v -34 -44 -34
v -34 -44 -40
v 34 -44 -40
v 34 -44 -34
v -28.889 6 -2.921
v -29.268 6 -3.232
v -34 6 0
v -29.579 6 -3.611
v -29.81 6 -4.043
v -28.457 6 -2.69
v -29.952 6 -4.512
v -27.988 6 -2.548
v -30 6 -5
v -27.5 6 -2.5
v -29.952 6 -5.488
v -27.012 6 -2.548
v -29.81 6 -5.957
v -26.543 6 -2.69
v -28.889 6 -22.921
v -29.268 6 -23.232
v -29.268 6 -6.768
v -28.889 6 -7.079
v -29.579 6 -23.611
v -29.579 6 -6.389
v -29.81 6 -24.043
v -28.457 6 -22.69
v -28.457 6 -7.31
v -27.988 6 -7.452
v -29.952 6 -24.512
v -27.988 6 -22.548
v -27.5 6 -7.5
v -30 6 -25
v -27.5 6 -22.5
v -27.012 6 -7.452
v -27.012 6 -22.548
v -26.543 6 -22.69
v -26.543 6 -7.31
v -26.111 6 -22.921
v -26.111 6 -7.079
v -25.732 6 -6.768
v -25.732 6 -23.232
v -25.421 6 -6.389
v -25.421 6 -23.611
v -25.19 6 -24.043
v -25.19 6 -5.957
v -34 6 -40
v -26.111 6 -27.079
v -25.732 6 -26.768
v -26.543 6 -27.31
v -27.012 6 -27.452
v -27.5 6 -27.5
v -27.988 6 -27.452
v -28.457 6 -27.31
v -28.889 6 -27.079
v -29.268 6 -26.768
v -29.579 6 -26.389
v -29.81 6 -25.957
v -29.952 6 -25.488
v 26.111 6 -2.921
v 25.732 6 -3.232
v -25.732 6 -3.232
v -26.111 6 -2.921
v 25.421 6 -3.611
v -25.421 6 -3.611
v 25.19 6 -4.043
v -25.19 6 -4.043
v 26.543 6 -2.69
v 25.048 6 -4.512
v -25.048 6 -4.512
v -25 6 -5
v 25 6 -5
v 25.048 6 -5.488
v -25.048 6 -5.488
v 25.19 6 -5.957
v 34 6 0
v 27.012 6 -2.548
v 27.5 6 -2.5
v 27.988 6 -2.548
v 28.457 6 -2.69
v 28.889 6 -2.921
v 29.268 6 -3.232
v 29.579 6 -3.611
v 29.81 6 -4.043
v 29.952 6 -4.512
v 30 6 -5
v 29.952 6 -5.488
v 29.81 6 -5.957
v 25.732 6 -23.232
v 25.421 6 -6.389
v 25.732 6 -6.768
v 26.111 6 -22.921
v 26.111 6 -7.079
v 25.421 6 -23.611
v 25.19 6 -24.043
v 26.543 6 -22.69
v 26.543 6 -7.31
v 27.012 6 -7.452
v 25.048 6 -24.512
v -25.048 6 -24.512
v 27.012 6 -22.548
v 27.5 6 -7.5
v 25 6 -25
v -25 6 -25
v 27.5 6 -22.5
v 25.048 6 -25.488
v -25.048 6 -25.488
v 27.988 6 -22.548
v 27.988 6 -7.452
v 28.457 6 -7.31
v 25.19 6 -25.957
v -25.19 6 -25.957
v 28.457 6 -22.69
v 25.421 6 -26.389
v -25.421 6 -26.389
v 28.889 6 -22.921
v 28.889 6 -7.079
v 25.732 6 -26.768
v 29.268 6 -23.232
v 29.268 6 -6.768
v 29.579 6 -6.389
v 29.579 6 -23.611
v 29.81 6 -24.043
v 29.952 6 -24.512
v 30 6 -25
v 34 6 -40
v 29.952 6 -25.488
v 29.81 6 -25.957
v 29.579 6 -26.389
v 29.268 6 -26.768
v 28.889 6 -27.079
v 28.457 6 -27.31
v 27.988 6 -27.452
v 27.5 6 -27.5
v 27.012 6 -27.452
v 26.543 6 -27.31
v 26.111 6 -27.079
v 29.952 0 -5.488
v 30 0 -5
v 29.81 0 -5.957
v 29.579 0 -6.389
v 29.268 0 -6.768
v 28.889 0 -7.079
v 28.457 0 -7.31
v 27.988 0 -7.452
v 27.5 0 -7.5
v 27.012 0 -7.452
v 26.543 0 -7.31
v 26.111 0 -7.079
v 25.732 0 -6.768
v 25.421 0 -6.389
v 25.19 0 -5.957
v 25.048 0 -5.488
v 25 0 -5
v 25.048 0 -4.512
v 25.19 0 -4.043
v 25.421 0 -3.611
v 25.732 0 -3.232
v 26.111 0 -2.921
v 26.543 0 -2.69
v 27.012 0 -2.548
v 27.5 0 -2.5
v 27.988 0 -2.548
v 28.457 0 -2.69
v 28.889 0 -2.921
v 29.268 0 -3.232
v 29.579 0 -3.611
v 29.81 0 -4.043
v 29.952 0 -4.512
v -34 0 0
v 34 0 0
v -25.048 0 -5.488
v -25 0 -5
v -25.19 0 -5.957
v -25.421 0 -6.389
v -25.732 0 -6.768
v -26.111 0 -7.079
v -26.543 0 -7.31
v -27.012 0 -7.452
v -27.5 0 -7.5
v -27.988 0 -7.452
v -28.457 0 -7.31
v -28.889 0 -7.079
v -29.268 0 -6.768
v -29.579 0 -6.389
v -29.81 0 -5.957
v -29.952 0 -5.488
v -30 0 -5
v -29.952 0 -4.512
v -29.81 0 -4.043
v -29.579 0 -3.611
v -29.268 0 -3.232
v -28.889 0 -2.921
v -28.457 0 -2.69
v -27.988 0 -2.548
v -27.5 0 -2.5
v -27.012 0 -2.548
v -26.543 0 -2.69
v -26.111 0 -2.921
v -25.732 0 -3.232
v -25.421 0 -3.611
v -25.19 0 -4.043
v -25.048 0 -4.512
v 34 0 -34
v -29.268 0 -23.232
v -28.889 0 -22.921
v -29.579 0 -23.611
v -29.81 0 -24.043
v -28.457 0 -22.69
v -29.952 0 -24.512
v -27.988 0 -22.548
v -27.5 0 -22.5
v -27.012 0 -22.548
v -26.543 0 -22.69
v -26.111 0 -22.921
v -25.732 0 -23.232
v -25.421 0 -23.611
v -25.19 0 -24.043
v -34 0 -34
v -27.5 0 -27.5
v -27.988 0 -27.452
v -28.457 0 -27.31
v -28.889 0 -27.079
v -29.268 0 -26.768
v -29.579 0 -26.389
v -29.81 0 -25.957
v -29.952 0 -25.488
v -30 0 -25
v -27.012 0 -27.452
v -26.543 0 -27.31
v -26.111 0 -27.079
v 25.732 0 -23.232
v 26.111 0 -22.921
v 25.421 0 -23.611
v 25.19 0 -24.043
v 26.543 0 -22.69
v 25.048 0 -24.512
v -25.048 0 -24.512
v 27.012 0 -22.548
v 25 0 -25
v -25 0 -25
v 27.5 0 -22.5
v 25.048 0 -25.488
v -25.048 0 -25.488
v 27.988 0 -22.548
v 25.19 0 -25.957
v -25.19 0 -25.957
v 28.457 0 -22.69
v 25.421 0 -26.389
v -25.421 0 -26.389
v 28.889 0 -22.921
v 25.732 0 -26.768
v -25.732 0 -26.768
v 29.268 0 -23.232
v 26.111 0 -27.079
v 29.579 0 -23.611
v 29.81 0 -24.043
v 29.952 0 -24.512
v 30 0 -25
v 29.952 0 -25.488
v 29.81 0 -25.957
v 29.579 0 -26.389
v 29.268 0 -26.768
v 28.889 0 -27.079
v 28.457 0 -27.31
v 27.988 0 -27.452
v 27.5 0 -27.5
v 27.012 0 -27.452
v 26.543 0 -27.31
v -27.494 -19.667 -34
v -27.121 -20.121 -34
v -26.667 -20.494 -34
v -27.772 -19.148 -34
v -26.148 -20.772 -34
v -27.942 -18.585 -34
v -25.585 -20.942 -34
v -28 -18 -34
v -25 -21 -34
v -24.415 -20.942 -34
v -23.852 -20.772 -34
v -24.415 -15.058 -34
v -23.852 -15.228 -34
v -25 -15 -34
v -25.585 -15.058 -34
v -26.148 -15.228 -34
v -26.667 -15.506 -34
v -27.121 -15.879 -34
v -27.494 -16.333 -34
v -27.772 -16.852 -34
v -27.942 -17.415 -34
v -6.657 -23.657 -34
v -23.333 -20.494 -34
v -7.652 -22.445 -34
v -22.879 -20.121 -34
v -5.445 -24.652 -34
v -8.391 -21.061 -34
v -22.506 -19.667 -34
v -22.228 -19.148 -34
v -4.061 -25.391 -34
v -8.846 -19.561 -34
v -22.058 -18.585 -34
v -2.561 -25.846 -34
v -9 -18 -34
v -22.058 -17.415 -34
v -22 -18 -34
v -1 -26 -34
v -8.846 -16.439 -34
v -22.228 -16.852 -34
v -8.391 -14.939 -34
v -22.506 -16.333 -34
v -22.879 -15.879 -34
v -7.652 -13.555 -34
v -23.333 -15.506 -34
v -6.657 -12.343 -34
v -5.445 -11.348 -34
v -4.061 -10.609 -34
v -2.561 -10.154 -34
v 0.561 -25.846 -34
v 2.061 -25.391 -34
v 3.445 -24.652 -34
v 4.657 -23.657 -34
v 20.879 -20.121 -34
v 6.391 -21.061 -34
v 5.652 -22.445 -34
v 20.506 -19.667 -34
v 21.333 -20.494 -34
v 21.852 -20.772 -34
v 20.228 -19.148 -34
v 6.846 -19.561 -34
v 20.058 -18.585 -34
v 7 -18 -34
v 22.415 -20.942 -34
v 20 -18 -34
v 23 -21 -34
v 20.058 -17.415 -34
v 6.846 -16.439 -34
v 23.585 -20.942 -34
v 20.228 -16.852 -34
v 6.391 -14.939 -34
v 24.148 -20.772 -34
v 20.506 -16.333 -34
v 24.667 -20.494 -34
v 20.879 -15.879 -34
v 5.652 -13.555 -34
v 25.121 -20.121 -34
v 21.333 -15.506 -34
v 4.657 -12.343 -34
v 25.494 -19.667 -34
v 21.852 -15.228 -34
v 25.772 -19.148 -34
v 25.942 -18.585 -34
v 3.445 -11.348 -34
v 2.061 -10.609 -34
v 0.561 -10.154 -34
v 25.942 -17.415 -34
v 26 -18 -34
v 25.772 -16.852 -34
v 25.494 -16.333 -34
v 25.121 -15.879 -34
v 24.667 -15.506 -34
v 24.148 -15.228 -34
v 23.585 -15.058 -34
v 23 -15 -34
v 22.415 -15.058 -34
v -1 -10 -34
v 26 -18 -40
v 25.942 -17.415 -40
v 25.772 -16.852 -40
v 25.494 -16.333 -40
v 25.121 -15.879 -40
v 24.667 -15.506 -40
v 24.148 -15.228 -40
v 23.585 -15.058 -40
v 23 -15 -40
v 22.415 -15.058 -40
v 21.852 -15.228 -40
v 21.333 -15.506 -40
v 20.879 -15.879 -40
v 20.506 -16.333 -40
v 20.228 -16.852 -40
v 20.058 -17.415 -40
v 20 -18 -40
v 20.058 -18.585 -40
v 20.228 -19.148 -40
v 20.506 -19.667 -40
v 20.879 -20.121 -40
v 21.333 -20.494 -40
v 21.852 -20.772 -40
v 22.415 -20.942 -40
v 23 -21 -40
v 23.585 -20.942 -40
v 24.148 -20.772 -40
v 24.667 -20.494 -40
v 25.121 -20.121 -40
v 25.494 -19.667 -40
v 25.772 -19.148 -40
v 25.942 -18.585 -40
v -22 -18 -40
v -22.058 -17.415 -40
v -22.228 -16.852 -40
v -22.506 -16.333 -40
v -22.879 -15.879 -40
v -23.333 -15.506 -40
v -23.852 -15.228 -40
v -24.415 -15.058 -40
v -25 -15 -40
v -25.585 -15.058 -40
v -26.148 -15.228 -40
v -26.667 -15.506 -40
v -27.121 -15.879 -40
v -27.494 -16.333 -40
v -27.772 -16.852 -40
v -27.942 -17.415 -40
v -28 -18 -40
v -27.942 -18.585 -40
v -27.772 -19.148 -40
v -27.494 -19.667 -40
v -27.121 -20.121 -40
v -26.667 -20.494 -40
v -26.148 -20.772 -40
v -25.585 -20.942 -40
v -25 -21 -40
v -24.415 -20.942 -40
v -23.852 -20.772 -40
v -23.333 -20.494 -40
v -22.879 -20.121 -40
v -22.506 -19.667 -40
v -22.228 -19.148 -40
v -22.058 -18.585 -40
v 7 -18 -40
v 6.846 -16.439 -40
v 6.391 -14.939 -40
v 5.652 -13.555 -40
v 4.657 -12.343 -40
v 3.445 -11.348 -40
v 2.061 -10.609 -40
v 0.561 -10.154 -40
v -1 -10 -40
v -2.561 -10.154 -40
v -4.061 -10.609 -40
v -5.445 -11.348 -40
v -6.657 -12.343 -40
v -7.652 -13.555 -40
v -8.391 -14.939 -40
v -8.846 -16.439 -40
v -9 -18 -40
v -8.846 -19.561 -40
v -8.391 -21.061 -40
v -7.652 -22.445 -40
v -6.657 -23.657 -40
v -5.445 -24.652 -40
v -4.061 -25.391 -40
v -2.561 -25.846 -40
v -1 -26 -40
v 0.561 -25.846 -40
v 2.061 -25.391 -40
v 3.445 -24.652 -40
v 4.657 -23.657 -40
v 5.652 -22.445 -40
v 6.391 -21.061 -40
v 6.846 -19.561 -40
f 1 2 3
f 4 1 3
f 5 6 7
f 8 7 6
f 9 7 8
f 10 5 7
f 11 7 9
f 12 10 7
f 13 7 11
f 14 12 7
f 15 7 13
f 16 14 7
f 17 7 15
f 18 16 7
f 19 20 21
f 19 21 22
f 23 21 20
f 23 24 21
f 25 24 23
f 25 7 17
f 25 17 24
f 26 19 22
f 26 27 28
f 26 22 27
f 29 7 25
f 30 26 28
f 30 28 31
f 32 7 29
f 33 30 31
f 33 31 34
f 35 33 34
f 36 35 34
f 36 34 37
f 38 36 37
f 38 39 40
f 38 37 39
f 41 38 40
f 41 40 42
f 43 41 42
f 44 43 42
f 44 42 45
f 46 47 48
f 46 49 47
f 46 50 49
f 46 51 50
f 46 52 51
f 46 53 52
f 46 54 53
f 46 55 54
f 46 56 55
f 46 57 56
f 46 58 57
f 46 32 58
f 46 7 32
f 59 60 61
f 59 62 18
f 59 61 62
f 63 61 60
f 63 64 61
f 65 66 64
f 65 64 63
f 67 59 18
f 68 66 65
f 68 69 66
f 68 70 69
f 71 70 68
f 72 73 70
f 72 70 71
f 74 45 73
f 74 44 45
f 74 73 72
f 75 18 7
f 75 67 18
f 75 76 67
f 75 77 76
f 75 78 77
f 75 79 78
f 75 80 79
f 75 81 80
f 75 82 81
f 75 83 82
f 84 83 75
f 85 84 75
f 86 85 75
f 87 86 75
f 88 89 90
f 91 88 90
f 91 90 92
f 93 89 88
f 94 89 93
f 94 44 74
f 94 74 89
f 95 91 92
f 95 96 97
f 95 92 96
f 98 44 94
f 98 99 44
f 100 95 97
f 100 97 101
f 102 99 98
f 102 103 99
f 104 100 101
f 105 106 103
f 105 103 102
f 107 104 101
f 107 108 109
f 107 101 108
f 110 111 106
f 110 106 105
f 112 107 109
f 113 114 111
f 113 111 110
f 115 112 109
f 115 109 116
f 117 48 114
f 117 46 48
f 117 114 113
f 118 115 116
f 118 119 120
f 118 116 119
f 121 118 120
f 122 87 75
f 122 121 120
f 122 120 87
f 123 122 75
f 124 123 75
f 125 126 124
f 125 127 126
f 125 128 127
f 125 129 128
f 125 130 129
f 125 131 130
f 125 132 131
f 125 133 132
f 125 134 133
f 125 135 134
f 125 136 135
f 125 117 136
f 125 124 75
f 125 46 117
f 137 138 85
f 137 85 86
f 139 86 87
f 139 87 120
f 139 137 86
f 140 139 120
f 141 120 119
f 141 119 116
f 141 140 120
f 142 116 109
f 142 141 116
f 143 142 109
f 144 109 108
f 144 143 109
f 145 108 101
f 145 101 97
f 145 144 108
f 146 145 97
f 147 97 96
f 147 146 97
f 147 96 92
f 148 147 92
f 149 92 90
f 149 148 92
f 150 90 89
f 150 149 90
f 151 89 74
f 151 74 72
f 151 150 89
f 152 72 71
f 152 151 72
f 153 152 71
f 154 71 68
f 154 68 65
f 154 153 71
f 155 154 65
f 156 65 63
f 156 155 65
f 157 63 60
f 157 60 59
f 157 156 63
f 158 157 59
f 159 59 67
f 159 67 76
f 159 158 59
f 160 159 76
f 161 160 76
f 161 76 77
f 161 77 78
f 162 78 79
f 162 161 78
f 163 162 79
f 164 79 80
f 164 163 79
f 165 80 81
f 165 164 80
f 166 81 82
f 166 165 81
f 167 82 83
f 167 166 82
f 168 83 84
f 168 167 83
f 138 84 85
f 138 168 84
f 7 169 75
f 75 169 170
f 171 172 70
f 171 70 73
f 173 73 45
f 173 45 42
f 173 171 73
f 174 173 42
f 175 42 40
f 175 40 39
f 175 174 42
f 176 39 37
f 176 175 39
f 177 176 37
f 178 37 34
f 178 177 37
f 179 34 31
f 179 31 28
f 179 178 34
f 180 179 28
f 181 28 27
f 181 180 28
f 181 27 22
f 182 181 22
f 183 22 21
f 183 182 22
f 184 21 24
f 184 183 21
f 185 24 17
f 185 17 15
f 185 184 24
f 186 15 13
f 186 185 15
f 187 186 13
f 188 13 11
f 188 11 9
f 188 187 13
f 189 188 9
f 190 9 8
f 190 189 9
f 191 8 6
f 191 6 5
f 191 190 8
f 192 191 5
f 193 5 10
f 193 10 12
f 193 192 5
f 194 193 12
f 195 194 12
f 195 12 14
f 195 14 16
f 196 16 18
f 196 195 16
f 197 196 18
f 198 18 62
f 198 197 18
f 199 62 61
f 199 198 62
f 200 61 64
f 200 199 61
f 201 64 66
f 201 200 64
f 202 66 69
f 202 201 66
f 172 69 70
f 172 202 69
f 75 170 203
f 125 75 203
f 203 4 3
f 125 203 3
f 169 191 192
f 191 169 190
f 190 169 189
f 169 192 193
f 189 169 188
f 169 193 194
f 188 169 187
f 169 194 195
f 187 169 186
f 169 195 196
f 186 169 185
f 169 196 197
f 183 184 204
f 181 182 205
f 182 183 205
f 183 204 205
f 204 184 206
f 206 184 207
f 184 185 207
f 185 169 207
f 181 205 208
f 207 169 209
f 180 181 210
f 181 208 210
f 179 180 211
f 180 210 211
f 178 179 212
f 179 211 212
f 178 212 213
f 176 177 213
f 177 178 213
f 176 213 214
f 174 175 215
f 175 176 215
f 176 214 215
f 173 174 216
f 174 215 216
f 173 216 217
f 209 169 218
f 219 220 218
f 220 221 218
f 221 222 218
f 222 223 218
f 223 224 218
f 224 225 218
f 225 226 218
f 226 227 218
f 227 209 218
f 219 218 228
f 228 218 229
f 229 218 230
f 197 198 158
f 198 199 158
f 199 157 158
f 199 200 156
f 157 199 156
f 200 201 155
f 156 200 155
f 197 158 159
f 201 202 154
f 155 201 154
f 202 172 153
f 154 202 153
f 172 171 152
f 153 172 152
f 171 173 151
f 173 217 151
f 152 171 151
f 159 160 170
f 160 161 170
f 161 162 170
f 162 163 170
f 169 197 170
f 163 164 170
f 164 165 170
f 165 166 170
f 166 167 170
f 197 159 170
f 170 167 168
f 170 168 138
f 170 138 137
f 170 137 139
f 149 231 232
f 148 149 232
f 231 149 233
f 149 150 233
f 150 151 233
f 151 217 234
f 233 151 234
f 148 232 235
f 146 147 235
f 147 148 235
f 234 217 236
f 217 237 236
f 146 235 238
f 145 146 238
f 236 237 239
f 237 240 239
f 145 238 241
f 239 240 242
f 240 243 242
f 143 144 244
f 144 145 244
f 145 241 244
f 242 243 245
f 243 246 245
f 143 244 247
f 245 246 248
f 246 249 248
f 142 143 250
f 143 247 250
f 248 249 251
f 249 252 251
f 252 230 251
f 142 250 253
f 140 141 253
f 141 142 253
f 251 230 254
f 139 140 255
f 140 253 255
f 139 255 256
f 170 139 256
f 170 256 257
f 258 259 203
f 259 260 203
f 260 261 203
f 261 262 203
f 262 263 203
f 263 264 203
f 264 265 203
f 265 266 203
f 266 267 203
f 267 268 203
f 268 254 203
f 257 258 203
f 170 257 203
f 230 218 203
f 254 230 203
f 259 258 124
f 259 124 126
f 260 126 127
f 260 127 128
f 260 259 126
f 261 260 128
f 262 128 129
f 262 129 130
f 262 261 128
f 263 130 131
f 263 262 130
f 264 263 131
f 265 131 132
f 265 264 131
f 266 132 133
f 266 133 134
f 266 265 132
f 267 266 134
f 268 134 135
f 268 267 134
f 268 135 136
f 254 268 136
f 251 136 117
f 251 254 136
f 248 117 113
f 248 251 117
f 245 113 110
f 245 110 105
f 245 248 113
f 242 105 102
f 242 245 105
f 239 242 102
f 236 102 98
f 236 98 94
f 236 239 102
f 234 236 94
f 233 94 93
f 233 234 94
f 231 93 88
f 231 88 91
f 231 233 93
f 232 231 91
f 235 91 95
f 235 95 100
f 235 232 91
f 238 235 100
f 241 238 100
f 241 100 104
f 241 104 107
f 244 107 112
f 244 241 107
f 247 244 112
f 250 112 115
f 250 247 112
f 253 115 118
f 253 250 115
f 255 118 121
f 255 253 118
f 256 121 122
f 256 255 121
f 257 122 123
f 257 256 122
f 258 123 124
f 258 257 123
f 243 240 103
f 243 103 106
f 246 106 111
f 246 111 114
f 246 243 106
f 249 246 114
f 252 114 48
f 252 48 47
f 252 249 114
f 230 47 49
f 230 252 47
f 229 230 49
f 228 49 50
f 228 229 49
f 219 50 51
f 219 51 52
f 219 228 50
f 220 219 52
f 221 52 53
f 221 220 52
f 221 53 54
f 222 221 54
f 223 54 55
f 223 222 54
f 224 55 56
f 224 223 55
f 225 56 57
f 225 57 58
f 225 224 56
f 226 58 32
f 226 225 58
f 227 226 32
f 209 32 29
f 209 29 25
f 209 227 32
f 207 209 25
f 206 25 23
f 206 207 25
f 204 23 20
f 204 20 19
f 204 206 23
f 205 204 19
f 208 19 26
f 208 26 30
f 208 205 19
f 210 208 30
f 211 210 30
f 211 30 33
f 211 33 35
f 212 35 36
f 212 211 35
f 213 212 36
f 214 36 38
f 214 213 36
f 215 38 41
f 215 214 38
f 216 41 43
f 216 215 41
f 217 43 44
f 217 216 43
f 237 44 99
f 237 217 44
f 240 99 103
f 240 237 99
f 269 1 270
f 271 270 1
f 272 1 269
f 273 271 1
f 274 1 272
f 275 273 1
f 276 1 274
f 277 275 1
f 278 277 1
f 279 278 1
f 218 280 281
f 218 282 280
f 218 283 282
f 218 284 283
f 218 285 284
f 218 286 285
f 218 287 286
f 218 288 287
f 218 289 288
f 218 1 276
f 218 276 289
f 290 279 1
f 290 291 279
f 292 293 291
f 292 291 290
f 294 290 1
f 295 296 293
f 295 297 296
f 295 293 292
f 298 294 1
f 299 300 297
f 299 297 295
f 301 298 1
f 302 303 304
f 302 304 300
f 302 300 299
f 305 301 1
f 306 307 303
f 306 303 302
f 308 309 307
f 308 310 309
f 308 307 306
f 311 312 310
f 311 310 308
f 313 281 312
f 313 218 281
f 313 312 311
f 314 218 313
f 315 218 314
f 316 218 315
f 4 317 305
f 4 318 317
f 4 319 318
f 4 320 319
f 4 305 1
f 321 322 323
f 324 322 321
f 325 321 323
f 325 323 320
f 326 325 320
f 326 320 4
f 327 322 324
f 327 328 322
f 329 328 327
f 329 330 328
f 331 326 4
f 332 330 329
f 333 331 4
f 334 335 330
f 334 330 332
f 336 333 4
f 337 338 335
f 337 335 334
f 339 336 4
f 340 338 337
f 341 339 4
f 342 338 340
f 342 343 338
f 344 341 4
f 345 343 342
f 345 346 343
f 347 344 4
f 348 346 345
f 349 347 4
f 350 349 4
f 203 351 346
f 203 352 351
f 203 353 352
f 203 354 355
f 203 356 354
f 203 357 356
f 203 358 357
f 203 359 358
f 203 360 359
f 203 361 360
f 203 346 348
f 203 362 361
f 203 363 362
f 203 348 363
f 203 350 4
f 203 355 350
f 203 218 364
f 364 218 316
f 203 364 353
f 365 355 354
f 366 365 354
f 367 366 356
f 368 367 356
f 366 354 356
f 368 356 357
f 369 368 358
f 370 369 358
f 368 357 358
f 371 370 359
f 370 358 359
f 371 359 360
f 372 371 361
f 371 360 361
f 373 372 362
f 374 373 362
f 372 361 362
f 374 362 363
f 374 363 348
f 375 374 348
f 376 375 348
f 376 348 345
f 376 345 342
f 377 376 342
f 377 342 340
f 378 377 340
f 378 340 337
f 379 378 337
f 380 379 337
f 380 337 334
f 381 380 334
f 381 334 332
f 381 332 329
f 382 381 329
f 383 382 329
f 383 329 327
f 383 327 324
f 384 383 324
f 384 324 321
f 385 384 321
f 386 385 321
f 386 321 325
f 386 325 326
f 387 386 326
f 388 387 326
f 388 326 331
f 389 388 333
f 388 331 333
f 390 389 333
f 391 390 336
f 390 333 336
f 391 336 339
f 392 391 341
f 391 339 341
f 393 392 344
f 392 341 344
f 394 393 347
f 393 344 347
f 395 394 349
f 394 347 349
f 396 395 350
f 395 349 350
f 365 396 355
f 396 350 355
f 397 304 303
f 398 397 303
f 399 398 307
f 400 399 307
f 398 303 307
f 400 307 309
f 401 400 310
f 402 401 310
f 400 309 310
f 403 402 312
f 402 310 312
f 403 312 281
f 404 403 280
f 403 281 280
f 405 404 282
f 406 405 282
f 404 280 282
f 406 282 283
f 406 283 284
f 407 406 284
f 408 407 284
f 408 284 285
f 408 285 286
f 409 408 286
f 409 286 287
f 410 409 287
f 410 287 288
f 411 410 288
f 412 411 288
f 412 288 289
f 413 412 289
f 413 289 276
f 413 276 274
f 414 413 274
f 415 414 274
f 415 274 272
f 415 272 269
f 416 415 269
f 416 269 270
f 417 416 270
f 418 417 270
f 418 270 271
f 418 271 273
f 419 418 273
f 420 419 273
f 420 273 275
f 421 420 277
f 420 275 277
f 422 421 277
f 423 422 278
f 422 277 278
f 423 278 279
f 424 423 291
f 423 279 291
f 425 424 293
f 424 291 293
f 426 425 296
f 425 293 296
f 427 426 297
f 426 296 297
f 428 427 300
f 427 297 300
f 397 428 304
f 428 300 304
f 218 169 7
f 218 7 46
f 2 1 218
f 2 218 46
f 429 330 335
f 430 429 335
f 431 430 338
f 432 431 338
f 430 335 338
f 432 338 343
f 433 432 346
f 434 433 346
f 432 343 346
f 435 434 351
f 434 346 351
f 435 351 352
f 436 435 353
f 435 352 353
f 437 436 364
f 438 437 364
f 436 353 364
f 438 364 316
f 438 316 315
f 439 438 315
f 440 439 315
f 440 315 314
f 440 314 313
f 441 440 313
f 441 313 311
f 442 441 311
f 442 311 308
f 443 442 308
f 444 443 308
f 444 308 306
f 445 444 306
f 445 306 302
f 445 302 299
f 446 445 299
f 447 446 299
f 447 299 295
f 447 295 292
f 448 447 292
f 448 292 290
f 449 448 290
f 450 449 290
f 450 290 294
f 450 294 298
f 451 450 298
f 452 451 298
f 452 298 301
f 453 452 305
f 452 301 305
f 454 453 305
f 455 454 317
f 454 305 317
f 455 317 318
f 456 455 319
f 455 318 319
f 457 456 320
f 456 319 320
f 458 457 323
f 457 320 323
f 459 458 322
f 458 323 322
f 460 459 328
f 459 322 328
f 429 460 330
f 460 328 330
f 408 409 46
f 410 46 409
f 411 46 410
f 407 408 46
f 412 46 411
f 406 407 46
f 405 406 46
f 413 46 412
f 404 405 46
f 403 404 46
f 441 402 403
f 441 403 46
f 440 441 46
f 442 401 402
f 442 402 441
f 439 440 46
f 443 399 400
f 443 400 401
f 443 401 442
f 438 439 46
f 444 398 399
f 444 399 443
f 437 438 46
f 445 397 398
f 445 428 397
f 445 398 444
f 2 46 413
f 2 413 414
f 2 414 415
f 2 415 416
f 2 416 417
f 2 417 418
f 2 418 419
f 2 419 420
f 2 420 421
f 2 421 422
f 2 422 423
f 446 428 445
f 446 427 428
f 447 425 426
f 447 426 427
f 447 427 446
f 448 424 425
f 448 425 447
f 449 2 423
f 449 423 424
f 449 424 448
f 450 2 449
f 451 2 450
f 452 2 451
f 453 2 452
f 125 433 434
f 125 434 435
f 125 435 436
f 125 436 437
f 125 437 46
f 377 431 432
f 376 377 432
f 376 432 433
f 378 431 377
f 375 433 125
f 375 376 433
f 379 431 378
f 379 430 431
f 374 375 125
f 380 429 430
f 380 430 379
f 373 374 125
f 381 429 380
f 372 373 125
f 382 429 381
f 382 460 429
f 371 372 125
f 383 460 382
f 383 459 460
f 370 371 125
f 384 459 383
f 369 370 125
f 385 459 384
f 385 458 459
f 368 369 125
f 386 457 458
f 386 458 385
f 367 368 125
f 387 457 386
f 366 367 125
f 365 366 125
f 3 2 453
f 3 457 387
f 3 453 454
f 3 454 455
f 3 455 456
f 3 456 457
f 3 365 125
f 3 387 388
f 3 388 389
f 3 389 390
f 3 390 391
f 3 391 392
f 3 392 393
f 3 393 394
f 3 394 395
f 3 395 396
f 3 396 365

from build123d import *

# Parameters (mm, degrees)
SKETCH_1_W          = 68
SKETCH_1_H          = 40
SKETCH_1_R          = 2.5
EXTRUDE_1_DEPTH     = 6
SKETCH_3_W          = 68
SKETCH_3_H          = 6
EXTRUDE_2_DEPTH     = 50
CUT_EXTRUDE_1_REACH = 8
SKETCH_4_R          = 8
SKETCH_4_R_2        = 3


with BuildPart() as part:
    # 草图1 → 凸台-拉伸1 (new body)
    with BuildSketch(Plane(origin=(0, 0, 0), x_dir=(1, 0, 0), z_dir=(0, 1, 0))):
        with Locations((0, 20)):
            Rectangle(SKETCH_1_W, SKETCH_1_H)
        with Locations((-27.5, 25)):
            Circle(SKETCH_1_R, mode=Mode.SUBTRACT)
        with Locations((27.5, 25)):
            Circle(SKETCH_1_R, mode=Mode.SUBTRACT)
        with Locations((-27.5, 5)):
            Circle(SKETCH_1_R, mode=Mode.SUBTRACT)
        with Locations((27.5, 5)):
            Circle(SKETCH_1_R, mode=Mode.SUBTRACT)
    extrude(amount=EXTRUDE_1_DEPTH)

    # 草图3 → 凸台-拉伸2 (add)
    with BuildSketch(Plane(origin=(0, 6, 0), x_dir=(1, 0, 0), z_dir=(0, 1, 0))):
        with Locations((0, 37)):
            Rectangle(SKETCH_3_W, SKETCH_3_H)
    extrude(amount=-EXTRUDE_2_DEPTH)

    # 草图4 → 切除-拉伸1 (cut, up to next)
    with BuildSketch(Plane.XY.offset(-34), mode=Mode.PRIVATE) as cut_extrude_1_sk1:
        with Locations((-1, -18)):
            Circle(SKETCH_4_R)
    cut_extrude_1_tool1 = extrude(cut_extrude_1_sk1.sketch, amount=-CUT_EXTRUDE_1_REACH, mode=Mode.PRIVATE) & part.part
    add(cut_extrude_1_tool1.solids().sort_by_distance((-1, -18, -34))[0], mode=Mode.SUBTRACT)
    # 草图4 → 切除-拉伸1 (cut, up to next)
    with BuildSketch(Plane.XY.offset(-34), mode=Mode.PRIVATE) as cut_extrude_1_sk2:
        with Locations((23, -18)):
            Circle(SKETCH_4_R_2)
    cut_extrude_1_tool2 = extrude(cut_extrude_1_sk2.sketch, amount=-CUT_EXTRUDE_1_REACH, mode=Mode.PRIVATE) & part.part
    add(cut_extrude_1_tool2.solids().sort_by_distance((23, -18, -34))[0], mode=Mode.SUBTRACT)
    # 草图4 → 切除-拉伸1 (cut, up to next)
    with BuildSketch(Plane.XY.offset(-34), mode=Mode.PRIVATE) as cut_extrude_1_sk3:
        with Locations((-25, -18)):
            Circle(SKETCH_4_R_2)
    cut_extrude_1_tool3 = extrude(cut_extrude_1_sk3.sketch, amount=-CUT_EXTRUDE_1_REACH, mode=Mode.PRIVATE) & part.part
    add(cut_extrude_1_tool3.solids().sort_by_distance((-25, -18, -34))[0], mode=Mode.SUBTRACT)


solid = part.part
